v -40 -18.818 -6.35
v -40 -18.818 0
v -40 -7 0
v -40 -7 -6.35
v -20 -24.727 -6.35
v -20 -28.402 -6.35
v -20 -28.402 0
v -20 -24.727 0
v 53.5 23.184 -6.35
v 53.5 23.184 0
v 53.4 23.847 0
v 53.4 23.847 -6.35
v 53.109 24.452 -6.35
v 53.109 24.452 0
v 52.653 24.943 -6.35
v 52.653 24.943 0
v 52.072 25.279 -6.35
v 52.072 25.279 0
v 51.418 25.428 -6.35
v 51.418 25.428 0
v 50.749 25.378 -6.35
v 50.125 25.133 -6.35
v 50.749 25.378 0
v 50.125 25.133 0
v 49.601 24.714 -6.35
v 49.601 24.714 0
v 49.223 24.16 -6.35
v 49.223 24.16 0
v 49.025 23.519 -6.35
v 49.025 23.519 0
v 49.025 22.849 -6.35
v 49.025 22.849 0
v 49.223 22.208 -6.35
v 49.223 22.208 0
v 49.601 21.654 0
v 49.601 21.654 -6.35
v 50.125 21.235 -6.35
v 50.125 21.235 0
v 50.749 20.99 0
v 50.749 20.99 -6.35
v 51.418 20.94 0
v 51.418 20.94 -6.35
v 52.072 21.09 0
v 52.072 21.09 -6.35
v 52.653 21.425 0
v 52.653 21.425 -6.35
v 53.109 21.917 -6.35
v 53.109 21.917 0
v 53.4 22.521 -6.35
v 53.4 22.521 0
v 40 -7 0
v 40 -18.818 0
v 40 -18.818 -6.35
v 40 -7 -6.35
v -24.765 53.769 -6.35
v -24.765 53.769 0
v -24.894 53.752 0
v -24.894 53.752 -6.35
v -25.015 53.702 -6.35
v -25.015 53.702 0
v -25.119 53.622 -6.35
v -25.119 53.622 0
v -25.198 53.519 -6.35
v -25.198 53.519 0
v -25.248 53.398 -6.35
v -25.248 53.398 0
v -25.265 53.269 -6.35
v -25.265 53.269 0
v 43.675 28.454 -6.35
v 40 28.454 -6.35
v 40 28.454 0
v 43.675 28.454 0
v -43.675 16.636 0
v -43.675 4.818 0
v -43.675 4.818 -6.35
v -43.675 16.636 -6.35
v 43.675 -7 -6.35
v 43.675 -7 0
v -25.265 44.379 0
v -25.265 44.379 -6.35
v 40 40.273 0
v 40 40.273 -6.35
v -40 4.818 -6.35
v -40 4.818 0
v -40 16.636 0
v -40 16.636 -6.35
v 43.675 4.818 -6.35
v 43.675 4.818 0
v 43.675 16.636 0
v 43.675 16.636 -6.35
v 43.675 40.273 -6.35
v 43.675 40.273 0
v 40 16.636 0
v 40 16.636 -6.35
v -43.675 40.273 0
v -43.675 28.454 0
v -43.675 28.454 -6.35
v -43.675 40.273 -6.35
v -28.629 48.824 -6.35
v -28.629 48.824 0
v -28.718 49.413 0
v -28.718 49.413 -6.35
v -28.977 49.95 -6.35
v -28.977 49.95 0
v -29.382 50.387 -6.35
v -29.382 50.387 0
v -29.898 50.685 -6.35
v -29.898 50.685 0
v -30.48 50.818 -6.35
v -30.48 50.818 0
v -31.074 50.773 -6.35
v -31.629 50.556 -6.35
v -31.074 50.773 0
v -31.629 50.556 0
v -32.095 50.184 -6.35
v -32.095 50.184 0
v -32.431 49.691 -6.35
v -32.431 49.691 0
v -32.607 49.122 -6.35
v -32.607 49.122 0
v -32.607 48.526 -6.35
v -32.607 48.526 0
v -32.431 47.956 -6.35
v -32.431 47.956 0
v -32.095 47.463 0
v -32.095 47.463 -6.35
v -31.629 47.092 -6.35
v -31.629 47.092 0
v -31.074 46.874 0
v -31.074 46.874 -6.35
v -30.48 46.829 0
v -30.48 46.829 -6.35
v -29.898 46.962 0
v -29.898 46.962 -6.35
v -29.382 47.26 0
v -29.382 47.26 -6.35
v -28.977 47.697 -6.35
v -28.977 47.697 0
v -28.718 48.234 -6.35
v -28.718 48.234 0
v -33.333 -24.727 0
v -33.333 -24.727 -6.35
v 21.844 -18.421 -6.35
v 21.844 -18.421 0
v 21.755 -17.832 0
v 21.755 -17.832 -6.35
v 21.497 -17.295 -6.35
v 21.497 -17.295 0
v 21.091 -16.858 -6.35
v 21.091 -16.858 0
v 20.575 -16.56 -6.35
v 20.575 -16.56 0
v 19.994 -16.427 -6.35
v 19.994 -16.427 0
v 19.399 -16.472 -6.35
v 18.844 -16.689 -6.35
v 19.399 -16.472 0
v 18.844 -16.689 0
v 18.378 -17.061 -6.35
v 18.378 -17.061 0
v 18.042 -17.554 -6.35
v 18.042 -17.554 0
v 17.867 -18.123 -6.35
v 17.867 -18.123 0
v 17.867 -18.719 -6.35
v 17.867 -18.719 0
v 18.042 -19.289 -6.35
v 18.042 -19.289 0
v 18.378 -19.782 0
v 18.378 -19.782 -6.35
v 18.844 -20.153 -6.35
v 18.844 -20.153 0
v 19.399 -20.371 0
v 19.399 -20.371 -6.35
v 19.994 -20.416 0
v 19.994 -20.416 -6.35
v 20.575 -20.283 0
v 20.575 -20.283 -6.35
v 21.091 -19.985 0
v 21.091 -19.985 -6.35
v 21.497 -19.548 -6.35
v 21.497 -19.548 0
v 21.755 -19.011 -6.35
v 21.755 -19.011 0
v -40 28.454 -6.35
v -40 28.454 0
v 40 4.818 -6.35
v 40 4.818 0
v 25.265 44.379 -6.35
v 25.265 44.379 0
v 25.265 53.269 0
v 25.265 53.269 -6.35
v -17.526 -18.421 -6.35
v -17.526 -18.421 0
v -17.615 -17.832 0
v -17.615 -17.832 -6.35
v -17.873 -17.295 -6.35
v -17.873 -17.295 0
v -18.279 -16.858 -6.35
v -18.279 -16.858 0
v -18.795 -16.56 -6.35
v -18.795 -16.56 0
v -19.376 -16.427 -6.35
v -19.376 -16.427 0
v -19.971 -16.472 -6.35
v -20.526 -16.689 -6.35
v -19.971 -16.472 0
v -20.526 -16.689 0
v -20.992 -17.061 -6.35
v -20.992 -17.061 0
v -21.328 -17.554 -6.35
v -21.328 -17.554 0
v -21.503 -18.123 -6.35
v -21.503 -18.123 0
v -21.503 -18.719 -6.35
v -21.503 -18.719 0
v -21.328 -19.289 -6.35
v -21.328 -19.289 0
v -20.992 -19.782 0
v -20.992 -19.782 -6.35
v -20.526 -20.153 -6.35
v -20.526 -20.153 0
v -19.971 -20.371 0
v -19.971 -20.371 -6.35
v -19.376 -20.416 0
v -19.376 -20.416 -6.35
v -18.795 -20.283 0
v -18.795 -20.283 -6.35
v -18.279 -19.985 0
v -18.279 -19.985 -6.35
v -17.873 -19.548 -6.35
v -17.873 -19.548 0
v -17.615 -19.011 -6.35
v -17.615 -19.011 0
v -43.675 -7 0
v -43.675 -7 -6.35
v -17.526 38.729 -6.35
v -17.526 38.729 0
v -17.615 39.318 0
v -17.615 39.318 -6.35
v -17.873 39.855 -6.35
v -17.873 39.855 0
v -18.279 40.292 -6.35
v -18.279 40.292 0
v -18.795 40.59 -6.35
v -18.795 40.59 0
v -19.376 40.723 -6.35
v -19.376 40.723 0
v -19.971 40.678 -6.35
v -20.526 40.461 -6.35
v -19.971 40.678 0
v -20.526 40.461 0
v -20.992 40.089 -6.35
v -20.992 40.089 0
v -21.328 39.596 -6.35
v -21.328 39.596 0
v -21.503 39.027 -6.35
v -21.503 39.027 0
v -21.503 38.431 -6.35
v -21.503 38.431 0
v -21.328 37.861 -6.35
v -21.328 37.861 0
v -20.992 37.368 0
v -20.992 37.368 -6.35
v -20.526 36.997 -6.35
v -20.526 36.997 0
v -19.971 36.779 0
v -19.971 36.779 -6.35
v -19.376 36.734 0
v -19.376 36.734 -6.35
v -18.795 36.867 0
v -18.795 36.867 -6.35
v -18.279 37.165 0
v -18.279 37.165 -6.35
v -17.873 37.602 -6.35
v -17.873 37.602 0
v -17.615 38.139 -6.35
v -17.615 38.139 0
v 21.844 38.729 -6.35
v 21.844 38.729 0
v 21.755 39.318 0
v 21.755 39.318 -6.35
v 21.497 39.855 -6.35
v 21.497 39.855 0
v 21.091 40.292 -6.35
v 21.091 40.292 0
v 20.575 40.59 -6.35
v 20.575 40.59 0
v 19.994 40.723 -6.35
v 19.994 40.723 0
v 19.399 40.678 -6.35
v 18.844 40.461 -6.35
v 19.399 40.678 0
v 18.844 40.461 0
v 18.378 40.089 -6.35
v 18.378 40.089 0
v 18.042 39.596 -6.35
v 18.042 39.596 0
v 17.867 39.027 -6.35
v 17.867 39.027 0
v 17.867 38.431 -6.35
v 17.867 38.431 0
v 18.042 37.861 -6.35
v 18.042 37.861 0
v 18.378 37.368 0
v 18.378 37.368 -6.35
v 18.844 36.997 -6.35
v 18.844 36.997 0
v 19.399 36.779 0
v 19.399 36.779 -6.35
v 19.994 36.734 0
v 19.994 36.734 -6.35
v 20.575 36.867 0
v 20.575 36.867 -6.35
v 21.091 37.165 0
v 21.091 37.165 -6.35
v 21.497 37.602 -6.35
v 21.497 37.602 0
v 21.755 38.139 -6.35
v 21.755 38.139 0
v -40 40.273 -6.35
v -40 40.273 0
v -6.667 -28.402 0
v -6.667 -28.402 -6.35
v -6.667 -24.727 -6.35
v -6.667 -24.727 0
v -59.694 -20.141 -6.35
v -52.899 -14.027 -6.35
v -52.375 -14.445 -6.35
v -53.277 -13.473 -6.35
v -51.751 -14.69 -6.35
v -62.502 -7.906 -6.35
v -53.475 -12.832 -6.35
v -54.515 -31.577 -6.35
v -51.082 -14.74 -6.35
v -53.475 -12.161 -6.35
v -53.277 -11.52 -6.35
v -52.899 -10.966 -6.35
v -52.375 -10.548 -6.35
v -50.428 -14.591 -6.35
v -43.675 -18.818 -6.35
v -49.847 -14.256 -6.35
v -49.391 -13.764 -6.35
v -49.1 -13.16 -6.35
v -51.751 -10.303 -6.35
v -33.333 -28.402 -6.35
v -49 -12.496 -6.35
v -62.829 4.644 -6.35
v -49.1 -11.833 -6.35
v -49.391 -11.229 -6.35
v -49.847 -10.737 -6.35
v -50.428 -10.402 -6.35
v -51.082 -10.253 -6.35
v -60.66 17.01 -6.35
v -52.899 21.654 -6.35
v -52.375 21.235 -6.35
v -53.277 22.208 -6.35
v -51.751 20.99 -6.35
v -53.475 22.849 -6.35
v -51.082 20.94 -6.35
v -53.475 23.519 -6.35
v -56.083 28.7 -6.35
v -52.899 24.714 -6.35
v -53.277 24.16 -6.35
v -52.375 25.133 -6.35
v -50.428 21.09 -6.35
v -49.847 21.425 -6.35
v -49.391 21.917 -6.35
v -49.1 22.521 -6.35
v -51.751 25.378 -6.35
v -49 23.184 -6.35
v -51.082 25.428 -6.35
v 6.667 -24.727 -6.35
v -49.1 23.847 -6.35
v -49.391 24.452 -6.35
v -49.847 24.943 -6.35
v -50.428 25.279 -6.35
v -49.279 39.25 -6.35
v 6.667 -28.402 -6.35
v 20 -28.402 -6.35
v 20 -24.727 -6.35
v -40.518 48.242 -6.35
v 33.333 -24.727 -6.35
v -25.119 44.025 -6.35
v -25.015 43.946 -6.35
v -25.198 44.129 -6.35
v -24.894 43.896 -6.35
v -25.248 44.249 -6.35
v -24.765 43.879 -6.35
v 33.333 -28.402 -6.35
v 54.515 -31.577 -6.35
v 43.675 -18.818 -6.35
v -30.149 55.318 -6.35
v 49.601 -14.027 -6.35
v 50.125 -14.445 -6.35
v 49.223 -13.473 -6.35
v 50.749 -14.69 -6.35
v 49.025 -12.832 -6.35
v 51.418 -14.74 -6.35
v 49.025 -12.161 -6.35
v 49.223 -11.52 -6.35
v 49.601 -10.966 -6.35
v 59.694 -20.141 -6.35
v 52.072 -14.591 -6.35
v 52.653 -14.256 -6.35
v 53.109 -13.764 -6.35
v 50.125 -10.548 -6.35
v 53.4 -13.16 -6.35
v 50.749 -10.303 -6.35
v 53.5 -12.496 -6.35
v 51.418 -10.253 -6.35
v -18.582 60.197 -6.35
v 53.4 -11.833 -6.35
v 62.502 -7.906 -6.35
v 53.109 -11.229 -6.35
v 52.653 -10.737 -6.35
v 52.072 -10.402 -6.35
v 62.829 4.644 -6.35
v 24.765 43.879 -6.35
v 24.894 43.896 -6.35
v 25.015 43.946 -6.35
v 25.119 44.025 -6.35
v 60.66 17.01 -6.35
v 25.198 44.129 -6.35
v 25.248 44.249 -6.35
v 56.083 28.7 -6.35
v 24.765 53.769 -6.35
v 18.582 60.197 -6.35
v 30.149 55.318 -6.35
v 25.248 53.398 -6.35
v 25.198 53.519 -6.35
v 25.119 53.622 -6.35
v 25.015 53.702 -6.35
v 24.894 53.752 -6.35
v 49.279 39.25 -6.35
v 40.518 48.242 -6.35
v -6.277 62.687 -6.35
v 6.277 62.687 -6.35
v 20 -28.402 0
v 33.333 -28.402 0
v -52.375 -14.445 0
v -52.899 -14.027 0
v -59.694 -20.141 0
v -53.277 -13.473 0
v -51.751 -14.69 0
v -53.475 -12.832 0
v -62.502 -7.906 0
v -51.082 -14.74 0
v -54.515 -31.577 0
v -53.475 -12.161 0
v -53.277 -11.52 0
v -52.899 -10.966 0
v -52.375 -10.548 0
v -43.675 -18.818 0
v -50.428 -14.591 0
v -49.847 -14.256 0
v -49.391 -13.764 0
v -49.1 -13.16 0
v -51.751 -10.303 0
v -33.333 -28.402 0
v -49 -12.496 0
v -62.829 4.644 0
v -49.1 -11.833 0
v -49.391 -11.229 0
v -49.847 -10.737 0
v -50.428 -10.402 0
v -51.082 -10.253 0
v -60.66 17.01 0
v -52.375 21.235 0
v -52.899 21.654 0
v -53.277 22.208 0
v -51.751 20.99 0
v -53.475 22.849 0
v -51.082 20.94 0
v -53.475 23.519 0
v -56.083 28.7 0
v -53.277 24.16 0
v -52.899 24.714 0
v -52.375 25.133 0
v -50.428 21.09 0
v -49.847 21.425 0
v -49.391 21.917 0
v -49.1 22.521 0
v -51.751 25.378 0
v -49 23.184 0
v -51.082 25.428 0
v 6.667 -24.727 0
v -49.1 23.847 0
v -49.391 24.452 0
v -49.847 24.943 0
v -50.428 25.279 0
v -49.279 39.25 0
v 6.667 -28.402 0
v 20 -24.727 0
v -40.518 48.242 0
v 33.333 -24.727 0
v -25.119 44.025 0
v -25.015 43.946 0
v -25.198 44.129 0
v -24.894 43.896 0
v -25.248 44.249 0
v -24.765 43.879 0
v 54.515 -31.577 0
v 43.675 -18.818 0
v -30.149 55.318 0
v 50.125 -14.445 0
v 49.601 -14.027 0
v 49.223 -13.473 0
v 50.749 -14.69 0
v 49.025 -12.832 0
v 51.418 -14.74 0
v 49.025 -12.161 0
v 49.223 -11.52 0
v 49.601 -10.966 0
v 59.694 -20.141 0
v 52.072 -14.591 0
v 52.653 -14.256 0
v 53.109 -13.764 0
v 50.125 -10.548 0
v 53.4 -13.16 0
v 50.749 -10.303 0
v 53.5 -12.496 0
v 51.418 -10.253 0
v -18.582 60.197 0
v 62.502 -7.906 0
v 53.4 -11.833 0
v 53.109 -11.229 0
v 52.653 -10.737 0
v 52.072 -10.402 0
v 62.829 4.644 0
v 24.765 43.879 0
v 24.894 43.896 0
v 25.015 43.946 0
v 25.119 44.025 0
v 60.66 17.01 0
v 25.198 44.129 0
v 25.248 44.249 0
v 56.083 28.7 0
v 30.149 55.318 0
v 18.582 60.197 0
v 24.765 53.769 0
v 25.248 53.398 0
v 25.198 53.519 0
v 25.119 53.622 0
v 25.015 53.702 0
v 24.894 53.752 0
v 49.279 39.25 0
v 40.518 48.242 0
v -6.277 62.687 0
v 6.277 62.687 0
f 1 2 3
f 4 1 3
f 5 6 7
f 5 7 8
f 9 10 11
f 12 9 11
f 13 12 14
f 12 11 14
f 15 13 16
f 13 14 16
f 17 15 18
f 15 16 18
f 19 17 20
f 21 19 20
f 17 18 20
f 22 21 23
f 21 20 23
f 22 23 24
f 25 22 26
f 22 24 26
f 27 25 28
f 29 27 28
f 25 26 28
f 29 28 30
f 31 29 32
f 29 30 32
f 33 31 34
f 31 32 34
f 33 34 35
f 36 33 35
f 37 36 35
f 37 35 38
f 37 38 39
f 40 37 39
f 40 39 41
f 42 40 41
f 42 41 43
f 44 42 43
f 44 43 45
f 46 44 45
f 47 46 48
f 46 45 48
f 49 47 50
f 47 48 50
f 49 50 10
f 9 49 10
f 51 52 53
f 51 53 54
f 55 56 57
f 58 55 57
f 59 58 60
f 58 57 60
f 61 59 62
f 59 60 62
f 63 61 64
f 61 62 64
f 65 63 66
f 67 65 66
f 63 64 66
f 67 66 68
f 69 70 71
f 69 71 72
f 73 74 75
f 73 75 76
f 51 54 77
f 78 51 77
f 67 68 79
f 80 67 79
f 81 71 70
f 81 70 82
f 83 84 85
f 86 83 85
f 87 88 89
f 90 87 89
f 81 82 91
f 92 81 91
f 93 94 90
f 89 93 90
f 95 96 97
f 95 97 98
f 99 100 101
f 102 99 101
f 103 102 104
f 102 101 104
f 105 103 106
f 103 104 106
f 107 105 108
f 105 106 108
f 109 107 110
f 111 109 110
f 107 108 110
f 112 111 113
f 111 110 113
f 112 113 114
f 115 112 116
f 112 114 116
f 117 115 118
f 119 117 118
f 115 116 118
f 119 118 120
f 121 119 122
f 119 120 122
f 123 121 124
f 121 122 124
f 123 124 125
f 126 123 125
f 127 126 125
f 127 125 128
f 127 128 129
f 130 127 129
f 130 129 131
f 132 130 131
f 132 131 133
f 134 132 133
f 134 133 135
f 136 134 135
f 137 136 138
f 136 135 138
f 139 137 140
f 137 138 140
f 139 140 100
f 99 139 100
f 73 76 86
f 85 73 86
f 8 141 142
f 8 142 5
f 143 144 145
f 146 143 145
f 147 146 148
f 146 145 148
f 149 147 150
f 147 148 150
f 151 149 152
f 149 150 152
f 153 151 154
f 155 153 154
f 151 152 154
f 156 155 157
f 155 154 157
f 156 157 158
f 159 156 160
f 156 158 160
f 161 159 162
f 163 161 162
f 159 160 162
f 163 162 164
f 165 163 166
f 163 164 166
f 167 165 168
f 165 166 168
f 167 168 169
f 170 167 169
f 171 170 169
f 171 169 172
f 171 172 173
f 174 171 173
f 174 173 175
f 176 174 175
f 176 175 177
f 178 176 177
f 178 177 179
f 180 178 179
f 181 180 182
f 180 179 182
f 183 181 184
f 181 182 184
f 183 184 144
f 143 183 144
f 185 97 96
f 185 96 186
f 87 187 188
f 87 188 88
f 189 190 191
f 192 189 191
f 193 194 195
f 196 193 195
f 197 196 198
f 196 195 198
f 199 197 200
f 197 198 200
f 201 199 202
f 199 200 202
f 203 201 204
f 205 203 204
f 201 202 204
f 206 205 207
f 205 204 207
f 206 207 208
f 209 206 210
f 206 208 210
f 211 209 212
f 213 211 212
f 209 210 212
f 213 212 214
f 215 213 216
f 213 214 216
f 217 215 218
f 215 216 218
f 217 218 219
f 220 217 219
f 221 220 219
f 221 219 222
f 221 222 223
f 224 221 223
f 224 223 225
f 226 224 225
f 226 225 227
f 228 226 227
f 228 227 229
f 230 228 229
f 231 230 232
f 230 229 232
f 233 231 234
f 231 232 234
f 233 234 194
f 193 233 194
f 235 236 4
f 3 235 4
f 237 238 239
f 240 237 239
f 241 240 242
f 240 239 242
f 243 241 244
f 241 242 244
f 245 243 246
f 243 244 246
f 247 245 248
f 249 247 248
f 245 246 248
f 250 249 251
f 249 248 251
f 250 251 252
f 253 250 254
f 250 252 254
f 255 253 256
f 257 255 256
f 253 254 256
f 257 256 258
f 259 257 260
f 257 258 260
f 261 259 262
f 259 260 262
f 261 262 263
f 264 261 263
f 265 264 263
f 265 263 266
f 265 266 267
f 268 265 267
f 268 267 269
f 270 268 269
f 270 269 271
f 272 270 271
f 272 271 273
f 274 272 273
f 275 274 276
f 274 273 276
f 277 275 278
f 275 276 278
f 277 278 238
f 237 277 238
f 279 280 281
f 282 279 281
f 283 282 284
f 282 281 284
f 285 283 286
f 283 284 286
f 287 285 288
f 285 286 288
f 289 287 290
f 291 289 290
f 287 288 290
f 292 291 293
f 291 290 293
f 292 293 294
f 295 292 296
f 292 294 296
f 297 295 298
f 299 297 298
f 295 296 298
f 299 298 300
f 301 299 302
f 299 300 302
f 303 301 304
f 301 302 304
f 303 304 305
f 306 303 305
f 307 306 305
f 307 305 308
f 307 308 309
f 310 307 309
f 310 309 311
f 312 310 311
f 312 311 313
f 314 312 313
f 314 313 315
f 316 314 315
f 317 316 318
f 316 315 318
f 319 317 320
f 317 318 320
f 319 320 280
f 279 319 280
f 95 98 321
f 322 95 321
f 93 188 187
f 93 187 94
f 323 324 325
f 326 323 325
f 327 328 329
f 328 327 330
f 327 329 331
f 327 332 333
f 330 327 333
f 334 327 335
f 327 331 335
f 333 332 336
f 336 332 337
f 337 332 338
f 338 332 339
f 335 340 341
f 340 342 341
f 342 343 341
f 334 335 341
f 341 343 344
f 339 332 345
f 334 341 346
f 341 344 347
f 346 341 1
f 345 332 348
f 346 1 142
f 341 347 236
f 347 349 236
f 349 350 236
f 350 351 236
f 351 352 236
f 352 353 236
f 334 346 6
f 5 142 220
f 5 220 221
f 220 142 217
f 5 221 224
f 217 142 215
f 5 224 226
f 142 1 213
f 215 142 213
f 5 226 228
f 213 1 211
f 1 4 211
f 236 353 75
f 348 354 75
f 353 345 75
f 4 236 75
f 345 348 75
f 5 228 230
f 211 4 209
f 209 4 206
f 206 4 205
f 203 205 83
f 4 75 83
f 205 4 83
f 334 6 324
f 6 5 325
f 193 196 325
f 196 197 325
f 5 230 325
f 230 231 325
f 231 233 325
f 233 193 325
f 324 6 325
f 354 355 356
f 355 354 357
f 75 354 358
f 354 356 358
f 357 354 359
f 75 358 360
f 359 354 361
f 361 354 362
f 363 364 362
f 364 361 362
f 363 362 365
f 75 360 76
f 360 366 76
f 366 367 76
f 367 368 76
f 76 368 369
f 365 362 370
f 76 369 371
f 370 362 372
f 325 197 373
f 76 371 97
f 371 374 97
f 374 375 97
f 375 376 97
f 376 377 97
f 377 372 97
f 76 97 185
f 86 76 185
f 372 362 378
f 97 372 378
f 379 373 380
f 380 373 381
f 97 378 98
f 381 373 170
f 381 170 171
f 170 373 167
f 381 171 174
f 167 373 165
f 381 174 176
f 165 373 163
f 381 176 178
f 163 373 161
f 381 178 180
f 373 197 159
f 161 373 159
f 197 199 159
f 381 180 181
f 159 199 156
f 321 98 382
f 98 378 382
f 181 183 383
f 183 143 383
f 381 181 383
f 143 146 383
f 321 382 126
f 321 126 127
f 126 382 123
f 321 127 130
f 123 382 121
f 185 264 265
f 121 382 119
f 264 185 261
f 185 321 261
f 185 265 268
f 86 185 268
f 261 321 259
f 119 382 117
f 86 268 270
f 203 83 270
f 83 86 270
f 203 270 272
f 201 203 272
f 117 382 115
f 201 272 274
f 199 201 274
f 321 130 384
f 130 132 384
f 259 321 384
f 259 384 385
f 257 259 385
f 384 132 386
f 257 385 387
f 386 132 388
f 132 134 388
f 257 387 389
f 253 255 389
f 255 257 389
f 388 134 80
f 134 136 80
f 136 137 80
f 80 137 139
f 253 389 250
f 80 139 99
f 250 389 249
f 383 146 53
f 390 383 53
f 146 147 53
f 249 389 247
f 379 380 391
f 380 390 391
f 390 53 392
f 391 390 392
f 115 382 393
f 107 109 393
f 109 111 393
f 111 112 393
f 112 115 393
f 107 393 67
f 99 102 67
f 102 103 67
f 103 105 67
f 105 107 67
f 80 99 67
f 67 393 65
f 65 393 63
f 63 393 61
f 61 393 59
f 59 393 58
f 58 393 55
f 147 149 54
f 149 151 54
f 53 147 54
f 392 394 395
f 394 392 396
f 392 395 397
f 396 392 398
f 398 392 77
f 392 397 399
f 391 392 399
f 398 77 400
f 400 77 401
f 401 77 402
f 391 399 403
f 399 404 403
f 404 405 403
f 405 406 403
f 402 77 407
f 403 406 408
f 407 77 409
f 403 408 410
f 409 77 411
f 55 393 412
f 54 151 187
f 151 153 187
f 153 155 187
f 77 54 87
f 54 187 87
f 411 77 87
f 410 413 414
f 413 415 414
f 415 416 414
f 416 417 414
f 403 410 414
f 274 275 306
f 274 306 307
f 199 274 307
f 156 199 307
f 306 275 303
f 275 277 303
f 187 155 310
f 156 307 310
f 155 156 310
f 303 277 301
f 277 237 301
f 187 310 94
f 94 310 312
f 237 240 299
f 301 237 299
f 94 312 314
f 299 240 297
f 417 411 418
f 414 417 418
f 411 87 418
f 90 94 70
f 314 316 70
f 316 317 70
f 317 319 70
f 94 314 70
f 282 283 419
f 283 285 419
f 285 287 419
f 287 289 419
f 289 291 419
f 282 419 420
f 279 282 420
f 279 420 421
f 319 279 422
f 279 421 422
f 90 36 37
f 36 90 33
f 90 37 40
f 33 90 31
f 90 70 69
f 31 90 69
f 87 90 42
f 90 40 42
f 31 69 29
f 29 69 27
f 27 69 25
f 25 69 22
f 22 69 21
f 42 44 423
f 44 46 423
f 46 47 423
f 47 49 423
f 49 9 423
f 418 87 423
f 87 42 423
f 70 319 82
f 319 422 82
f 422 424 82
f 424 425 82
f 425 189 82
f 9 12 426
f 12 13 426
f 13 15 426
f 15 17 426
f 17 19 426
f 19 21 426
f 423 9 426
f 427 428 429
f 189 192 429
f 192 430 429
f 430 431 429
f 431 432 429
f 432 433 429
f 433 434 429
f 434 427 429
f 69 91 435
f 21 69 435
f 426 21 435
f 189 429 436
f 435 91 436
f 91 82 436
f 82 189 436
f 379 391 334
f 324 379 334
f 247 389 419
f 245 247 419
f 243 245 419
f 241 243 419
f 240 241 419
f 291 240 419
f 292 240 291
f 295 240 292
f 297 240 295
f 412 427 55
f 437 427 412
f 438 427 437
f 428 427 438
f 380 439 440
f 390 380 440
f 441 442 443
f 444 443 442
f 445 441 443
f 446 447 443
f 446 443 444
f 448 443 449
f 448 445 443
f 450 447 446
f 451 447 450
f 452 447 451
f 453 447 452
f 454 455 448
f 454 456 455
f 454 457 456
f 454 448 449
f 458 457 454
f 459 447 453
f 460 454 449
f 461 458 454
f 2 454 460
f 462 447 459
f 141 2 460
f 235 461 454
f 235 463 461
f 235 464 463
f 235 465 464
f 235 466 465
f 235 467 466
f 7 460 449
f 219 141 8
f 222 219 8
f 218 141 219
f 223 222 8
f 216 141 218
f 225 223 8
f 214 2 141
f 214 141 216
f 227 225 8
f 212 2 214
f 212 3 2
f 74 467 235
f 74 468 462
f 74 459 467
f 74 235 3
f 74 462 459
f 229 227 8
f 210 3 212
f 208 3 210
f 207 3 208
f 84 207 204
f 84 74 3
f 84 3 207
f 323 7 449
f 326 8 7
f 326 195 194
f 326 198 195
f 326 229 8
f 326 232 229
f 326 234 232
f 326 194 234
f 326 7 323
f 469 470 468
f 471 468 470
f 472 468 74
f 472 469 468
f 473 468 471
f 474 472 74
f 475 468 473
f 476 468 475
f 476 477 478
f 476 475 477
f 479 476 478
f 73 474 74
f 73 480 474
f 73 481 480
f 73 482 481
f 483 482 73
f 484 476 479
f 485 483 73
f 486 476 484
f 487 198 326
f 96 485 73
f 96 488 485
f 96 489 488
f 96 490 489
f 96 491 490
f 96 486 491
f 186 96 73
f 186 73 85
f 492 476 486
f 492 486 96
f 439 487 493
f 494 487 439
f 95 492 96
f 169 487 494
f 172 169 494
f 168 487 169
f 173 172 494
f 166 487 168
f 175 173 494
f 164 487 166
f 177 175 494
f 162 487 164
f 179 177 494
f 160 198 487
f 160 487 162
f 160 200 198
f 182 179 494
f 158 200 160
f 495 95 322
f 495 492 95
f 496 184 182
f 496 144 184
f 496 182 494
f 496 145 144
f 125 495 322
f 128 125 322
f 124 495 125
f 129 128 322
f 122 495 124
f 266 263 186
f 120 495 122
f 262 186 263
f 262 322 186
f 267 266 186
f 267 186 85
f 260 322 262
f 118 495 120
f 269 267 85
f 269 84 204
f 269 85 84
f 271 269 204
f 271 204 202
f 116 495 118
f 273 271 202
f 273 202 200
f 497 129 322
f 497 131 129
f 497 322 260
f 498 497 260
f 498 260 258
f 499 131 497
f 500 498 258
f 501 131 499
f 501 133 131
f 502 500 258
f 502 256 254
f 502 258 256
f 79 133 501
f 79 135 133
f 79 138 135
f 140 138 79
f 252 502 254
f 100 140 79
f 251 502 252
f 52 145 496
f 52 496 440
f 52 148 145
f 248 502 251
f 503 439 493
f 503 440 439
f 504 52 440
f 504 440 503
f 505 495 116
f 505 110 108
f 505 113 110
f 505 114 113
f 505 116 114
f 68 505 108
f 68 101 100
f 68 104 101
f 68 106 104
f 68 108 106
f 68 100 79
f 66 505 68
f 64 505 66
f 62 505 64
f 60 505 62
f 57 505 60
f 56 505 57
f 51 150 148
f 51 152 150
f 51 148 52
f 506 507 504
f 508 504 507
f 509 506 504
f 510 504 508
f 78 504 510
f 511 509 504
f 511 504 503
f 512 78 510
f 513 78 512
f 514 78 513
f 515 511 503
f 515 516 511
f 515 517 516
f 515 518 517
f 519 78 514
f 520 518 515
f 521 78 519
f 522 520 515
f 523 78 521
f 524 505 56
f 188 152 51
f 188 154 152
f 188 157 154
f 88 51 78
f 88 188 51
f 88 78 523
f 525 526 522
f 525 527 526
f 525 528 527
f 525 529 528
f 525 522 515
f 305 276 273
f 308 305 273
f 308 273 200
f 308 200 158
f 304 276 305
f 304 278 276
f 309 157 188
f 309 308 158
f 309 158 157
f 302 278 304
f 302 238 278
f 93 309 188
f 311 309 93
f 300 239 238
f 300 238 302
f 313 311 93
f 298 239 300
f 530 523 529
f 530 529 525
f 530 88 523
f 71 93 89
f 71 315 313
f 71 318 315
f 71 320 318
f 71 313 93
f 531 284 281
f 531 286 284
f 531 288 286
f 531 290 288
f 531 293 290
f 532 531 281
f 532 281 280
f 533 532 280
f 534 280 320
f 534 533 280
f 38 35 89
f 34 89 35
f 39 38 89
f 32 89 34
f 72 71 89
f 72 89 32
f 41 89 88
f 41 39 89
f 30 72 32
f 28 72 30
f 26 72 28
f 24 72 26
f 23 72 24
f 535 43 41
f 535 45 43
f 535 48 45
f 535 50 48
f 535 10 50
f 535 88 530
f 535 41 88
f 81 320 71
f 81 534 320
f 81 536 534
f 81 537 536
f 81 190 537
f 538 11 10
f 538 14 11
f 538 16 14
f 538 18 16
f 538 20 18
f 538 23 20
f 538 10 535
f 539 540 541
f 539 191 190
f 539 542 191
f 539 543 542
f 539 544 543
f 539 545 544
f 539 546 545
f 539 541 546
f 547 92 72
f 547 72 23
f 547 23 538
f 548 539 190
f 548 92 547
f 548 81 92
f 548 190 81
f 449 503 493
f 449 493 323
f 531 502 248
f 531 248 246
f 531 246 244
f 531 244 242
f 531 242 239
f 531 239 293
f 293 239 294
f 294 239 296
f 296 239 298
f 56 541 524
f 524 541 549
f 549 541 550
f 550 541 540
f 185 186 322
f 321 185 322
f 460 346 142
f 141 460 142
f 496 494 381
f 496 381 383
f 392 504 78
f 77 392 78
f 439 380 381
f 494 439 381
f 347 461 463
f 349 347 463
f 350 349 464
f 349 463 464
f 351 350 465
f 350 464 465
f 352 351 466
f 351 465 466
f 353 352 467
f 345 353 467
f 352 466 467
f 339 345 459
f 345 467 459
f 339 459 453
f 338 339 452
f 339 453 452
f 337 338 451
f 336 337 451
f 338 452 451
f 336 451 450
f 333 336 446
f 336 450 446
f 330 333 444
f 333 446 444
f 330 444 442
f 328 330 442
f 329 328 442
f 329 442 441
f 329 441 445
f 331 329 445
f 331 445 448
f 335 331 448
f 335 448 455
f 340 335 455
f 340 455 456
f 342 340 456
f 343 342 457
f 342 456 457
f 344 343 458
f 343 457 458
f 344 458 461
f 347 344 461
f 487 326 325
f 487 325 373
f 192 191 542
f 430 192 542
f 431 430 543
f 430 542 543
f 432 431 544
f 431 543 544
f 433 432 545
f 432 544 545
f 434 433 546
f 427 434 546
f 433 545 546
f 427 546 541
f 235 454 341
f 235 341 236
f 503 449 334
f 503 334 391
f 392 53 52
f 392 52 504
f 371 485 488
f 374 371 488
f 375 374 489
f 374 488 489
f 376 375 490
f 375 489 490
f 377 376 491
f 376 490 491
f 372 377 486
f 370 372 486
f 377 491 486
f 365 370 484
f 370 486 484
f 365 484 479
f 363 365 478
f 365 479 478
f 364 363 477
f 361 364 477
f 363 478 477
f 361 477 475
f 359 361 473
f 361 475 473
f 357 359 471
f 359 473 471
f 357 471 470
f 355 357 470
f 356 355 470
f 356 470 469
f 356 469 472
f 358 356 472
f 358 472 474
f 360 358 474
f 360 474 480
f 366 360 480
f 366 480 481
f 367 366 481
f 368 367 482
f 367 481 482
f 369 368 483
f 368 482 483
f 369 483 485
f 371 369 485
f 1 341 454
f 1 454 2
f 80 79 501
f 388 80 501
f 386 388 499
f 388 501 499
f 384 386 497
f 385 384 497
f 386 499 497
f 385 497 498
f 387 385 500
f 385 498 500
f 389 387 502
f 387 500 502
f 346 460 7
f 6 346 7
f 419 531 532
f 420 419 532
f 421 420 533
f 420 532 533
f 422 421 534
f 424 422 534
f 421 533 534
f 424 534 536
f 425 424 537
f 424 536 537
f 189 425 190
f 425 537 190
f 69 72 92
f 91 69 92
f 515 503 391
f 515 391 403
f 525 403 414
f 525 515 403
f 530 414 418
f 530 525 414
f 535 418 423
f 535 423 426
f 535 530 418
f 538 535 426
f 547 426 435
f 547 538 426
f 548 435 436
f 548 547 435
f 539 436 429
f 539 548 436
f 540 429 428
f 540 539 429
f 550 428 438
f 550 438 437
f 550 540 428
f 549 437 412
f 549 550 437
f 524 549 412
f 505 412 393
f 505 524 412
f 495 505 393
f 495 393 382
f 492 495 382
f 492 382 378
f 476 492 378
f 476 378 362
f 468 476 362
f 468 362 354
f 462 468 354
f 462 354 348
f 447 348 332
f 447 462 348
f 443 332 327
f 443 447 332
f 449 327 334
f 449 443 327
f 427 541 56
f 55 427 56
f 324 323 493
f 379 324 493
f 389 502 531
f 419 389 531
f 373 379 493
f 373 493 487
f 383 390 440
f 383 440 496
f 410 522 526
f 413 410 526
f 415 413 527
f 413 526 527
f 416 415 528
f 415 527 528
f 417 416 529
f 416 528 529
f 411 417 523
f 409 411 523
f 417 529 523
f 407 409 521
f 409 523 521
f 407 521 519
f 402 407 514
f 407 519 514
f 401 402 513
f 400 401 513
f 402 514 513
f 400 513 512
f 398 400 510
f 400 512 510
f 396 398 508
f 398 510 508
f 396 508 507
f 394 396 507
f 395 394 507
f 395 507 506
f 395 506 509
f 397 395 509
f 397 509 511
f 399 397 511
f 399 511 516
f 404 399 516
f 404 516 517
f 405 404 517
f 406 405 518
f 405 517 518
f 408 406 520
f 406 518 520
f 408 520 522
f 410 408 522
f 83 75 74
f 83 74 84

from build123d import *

# Parameters (mm, degrees)
SKETCH1_R           = 2.25
SKETCH1_R_2         = 2
SKETCH1_W           = 13.333333333
SKETCH1_H           = 3.675
SKETCH1_W_2         = 13.333333334
SKETCH1_W_3         = 3.675
SKETCH1_H_2         = 11.818181818
BOSS_EXTRUDE1_DEPTH = 6.35


with BuildPart() as part:
    # Sketch1 → Boss-Extrude1 (new body)
    with BuildSketch(Plane.XY):
        with BuildLine():
            Line((-54.514802885, -31.577464534), (54.514802885, -31.577464534))
            ThreePointArc((54.514802885, -31.577464534), (0, 63), (-54.514802885, -31.577464534))
        make_face()
        with Locations((-51.25, 23.184046239)):
            Circle(SKETCH1_R, mode=Mode.SUBTRACT)
        with Locations((-51.25, -12.496398734)):
            Circle(SKETCH1_R, mode=Mode.SUBTRACT)
        with Locations((-30.629163068, 48.823601552)):
            Circle(SKETCH1_R_2, mode=Mode.SUBTRACT)
        with Locations((51.25, 23.184046239)):
            Circle(SKETCH1_R, mode=Mode.SUBTRACT)
        with Locations((51.25, -12.496398734)):
            Circle(SKETCH1_R, mode=Mode.SUBTRACT)
        with Locations((-19.525679125, 38.728601552)):
            Circle(SKETCH1_R_2, mode=Mode.SUBTRACT)
        with Locations((-19.525679125, -18.421398448)):
            Circle(SKETCH1_R_2, mode=Mode.SUBTRACT)
        with Locations((19.844320875, -18.421398448)):
            Circle(SKETCH1_R_2, mode=Mode.SUBTRACT)
        with Locations((19.844320875, 38.728601552)):
            Circle(SKETCH1_R_2, mode=Mode.SUBTRACT)
        with Locations((26.666666666, -26.564964534)):
            Rectangle(SKETCH1_W, SKETCH1_H, mode=Mode.SUBTRACT)
        with Locations((0, -26.564964534)):
            Rectangle(SKETCH1_W_2, SKETCH1_H, mode=Mode.SUBTRACT)
        with Locations((-26.666666666, -26.564964534)):
            Rectangle(SKETCH1_W, SKETCH1_H, mode=Mode.SUBTRACT)
        with Locations((-41.8375, -12.909282716)):
            Rectangle(SKETCH1_W_3, SKETCH1_H_2, mode=Mode.SUBTRACT)
        with Locations((-41.8375, 10.727080921)):
            Rectangle(SKETCH1_W_3, SKETCH1_H_2, mode=Mode.SUBTRACT)
        with Locations((-41.8375, 34.363444557)):
            Rectangle(SKETCH1_W_3, SKETCH1_H_2, mode=Mode.SUBTRACT)
        with Locations((41.8375, -12.909282716)):
            Rectangle(SKETCH1_W_3, SKETCH1_H_2, mode=Mode.SUBTRACT)
        with Locations((41.8375, 10.727080921)):
            Rectangle(SKETCH1_W_3, SKETCH1_H_2, mode=Mode.SUBTRACT)
        with Locations((41.8375, 34.363444557)):
            Rectangle(SKETCH1_W_3, SKETCH1_H_2, mode=Mode.SUBTRACT)
        with BuildLine():
            Line((25.265, 44.378601552), (25.265, 53.268601552))
            ThreePointArc((25.265, 53.268601552), (25.118553391, 53.622154943), (24.765, 53.768601552))
            Line((24.765, 53.768601552), (-24.765, 53.768601552))
            ThreePointArc((-24.765, 53.768601552), (-25.118553391, 53.622154943), (-25.265, 53.268601552))
            Line((-25.265, 53.268601552), (-25.265, 44.378601552))
            ThreePointArc((-25.265, 44.378601552), (-25.118553391, 44.025048162), (-24.765, 43.878601552))
            Line((-24.765, 43.878601552), (24.765, 43.878601552))
            ThreePointArc((24.765, 43.878601552), (25.118553391, 44.025048162), (25.265, 44.378601552))
        make_face(mode=Mode.SUBTRACT)
    extrude(amount=-BOSS_EXTRUDE1_DEPTH)


solid = part.part
